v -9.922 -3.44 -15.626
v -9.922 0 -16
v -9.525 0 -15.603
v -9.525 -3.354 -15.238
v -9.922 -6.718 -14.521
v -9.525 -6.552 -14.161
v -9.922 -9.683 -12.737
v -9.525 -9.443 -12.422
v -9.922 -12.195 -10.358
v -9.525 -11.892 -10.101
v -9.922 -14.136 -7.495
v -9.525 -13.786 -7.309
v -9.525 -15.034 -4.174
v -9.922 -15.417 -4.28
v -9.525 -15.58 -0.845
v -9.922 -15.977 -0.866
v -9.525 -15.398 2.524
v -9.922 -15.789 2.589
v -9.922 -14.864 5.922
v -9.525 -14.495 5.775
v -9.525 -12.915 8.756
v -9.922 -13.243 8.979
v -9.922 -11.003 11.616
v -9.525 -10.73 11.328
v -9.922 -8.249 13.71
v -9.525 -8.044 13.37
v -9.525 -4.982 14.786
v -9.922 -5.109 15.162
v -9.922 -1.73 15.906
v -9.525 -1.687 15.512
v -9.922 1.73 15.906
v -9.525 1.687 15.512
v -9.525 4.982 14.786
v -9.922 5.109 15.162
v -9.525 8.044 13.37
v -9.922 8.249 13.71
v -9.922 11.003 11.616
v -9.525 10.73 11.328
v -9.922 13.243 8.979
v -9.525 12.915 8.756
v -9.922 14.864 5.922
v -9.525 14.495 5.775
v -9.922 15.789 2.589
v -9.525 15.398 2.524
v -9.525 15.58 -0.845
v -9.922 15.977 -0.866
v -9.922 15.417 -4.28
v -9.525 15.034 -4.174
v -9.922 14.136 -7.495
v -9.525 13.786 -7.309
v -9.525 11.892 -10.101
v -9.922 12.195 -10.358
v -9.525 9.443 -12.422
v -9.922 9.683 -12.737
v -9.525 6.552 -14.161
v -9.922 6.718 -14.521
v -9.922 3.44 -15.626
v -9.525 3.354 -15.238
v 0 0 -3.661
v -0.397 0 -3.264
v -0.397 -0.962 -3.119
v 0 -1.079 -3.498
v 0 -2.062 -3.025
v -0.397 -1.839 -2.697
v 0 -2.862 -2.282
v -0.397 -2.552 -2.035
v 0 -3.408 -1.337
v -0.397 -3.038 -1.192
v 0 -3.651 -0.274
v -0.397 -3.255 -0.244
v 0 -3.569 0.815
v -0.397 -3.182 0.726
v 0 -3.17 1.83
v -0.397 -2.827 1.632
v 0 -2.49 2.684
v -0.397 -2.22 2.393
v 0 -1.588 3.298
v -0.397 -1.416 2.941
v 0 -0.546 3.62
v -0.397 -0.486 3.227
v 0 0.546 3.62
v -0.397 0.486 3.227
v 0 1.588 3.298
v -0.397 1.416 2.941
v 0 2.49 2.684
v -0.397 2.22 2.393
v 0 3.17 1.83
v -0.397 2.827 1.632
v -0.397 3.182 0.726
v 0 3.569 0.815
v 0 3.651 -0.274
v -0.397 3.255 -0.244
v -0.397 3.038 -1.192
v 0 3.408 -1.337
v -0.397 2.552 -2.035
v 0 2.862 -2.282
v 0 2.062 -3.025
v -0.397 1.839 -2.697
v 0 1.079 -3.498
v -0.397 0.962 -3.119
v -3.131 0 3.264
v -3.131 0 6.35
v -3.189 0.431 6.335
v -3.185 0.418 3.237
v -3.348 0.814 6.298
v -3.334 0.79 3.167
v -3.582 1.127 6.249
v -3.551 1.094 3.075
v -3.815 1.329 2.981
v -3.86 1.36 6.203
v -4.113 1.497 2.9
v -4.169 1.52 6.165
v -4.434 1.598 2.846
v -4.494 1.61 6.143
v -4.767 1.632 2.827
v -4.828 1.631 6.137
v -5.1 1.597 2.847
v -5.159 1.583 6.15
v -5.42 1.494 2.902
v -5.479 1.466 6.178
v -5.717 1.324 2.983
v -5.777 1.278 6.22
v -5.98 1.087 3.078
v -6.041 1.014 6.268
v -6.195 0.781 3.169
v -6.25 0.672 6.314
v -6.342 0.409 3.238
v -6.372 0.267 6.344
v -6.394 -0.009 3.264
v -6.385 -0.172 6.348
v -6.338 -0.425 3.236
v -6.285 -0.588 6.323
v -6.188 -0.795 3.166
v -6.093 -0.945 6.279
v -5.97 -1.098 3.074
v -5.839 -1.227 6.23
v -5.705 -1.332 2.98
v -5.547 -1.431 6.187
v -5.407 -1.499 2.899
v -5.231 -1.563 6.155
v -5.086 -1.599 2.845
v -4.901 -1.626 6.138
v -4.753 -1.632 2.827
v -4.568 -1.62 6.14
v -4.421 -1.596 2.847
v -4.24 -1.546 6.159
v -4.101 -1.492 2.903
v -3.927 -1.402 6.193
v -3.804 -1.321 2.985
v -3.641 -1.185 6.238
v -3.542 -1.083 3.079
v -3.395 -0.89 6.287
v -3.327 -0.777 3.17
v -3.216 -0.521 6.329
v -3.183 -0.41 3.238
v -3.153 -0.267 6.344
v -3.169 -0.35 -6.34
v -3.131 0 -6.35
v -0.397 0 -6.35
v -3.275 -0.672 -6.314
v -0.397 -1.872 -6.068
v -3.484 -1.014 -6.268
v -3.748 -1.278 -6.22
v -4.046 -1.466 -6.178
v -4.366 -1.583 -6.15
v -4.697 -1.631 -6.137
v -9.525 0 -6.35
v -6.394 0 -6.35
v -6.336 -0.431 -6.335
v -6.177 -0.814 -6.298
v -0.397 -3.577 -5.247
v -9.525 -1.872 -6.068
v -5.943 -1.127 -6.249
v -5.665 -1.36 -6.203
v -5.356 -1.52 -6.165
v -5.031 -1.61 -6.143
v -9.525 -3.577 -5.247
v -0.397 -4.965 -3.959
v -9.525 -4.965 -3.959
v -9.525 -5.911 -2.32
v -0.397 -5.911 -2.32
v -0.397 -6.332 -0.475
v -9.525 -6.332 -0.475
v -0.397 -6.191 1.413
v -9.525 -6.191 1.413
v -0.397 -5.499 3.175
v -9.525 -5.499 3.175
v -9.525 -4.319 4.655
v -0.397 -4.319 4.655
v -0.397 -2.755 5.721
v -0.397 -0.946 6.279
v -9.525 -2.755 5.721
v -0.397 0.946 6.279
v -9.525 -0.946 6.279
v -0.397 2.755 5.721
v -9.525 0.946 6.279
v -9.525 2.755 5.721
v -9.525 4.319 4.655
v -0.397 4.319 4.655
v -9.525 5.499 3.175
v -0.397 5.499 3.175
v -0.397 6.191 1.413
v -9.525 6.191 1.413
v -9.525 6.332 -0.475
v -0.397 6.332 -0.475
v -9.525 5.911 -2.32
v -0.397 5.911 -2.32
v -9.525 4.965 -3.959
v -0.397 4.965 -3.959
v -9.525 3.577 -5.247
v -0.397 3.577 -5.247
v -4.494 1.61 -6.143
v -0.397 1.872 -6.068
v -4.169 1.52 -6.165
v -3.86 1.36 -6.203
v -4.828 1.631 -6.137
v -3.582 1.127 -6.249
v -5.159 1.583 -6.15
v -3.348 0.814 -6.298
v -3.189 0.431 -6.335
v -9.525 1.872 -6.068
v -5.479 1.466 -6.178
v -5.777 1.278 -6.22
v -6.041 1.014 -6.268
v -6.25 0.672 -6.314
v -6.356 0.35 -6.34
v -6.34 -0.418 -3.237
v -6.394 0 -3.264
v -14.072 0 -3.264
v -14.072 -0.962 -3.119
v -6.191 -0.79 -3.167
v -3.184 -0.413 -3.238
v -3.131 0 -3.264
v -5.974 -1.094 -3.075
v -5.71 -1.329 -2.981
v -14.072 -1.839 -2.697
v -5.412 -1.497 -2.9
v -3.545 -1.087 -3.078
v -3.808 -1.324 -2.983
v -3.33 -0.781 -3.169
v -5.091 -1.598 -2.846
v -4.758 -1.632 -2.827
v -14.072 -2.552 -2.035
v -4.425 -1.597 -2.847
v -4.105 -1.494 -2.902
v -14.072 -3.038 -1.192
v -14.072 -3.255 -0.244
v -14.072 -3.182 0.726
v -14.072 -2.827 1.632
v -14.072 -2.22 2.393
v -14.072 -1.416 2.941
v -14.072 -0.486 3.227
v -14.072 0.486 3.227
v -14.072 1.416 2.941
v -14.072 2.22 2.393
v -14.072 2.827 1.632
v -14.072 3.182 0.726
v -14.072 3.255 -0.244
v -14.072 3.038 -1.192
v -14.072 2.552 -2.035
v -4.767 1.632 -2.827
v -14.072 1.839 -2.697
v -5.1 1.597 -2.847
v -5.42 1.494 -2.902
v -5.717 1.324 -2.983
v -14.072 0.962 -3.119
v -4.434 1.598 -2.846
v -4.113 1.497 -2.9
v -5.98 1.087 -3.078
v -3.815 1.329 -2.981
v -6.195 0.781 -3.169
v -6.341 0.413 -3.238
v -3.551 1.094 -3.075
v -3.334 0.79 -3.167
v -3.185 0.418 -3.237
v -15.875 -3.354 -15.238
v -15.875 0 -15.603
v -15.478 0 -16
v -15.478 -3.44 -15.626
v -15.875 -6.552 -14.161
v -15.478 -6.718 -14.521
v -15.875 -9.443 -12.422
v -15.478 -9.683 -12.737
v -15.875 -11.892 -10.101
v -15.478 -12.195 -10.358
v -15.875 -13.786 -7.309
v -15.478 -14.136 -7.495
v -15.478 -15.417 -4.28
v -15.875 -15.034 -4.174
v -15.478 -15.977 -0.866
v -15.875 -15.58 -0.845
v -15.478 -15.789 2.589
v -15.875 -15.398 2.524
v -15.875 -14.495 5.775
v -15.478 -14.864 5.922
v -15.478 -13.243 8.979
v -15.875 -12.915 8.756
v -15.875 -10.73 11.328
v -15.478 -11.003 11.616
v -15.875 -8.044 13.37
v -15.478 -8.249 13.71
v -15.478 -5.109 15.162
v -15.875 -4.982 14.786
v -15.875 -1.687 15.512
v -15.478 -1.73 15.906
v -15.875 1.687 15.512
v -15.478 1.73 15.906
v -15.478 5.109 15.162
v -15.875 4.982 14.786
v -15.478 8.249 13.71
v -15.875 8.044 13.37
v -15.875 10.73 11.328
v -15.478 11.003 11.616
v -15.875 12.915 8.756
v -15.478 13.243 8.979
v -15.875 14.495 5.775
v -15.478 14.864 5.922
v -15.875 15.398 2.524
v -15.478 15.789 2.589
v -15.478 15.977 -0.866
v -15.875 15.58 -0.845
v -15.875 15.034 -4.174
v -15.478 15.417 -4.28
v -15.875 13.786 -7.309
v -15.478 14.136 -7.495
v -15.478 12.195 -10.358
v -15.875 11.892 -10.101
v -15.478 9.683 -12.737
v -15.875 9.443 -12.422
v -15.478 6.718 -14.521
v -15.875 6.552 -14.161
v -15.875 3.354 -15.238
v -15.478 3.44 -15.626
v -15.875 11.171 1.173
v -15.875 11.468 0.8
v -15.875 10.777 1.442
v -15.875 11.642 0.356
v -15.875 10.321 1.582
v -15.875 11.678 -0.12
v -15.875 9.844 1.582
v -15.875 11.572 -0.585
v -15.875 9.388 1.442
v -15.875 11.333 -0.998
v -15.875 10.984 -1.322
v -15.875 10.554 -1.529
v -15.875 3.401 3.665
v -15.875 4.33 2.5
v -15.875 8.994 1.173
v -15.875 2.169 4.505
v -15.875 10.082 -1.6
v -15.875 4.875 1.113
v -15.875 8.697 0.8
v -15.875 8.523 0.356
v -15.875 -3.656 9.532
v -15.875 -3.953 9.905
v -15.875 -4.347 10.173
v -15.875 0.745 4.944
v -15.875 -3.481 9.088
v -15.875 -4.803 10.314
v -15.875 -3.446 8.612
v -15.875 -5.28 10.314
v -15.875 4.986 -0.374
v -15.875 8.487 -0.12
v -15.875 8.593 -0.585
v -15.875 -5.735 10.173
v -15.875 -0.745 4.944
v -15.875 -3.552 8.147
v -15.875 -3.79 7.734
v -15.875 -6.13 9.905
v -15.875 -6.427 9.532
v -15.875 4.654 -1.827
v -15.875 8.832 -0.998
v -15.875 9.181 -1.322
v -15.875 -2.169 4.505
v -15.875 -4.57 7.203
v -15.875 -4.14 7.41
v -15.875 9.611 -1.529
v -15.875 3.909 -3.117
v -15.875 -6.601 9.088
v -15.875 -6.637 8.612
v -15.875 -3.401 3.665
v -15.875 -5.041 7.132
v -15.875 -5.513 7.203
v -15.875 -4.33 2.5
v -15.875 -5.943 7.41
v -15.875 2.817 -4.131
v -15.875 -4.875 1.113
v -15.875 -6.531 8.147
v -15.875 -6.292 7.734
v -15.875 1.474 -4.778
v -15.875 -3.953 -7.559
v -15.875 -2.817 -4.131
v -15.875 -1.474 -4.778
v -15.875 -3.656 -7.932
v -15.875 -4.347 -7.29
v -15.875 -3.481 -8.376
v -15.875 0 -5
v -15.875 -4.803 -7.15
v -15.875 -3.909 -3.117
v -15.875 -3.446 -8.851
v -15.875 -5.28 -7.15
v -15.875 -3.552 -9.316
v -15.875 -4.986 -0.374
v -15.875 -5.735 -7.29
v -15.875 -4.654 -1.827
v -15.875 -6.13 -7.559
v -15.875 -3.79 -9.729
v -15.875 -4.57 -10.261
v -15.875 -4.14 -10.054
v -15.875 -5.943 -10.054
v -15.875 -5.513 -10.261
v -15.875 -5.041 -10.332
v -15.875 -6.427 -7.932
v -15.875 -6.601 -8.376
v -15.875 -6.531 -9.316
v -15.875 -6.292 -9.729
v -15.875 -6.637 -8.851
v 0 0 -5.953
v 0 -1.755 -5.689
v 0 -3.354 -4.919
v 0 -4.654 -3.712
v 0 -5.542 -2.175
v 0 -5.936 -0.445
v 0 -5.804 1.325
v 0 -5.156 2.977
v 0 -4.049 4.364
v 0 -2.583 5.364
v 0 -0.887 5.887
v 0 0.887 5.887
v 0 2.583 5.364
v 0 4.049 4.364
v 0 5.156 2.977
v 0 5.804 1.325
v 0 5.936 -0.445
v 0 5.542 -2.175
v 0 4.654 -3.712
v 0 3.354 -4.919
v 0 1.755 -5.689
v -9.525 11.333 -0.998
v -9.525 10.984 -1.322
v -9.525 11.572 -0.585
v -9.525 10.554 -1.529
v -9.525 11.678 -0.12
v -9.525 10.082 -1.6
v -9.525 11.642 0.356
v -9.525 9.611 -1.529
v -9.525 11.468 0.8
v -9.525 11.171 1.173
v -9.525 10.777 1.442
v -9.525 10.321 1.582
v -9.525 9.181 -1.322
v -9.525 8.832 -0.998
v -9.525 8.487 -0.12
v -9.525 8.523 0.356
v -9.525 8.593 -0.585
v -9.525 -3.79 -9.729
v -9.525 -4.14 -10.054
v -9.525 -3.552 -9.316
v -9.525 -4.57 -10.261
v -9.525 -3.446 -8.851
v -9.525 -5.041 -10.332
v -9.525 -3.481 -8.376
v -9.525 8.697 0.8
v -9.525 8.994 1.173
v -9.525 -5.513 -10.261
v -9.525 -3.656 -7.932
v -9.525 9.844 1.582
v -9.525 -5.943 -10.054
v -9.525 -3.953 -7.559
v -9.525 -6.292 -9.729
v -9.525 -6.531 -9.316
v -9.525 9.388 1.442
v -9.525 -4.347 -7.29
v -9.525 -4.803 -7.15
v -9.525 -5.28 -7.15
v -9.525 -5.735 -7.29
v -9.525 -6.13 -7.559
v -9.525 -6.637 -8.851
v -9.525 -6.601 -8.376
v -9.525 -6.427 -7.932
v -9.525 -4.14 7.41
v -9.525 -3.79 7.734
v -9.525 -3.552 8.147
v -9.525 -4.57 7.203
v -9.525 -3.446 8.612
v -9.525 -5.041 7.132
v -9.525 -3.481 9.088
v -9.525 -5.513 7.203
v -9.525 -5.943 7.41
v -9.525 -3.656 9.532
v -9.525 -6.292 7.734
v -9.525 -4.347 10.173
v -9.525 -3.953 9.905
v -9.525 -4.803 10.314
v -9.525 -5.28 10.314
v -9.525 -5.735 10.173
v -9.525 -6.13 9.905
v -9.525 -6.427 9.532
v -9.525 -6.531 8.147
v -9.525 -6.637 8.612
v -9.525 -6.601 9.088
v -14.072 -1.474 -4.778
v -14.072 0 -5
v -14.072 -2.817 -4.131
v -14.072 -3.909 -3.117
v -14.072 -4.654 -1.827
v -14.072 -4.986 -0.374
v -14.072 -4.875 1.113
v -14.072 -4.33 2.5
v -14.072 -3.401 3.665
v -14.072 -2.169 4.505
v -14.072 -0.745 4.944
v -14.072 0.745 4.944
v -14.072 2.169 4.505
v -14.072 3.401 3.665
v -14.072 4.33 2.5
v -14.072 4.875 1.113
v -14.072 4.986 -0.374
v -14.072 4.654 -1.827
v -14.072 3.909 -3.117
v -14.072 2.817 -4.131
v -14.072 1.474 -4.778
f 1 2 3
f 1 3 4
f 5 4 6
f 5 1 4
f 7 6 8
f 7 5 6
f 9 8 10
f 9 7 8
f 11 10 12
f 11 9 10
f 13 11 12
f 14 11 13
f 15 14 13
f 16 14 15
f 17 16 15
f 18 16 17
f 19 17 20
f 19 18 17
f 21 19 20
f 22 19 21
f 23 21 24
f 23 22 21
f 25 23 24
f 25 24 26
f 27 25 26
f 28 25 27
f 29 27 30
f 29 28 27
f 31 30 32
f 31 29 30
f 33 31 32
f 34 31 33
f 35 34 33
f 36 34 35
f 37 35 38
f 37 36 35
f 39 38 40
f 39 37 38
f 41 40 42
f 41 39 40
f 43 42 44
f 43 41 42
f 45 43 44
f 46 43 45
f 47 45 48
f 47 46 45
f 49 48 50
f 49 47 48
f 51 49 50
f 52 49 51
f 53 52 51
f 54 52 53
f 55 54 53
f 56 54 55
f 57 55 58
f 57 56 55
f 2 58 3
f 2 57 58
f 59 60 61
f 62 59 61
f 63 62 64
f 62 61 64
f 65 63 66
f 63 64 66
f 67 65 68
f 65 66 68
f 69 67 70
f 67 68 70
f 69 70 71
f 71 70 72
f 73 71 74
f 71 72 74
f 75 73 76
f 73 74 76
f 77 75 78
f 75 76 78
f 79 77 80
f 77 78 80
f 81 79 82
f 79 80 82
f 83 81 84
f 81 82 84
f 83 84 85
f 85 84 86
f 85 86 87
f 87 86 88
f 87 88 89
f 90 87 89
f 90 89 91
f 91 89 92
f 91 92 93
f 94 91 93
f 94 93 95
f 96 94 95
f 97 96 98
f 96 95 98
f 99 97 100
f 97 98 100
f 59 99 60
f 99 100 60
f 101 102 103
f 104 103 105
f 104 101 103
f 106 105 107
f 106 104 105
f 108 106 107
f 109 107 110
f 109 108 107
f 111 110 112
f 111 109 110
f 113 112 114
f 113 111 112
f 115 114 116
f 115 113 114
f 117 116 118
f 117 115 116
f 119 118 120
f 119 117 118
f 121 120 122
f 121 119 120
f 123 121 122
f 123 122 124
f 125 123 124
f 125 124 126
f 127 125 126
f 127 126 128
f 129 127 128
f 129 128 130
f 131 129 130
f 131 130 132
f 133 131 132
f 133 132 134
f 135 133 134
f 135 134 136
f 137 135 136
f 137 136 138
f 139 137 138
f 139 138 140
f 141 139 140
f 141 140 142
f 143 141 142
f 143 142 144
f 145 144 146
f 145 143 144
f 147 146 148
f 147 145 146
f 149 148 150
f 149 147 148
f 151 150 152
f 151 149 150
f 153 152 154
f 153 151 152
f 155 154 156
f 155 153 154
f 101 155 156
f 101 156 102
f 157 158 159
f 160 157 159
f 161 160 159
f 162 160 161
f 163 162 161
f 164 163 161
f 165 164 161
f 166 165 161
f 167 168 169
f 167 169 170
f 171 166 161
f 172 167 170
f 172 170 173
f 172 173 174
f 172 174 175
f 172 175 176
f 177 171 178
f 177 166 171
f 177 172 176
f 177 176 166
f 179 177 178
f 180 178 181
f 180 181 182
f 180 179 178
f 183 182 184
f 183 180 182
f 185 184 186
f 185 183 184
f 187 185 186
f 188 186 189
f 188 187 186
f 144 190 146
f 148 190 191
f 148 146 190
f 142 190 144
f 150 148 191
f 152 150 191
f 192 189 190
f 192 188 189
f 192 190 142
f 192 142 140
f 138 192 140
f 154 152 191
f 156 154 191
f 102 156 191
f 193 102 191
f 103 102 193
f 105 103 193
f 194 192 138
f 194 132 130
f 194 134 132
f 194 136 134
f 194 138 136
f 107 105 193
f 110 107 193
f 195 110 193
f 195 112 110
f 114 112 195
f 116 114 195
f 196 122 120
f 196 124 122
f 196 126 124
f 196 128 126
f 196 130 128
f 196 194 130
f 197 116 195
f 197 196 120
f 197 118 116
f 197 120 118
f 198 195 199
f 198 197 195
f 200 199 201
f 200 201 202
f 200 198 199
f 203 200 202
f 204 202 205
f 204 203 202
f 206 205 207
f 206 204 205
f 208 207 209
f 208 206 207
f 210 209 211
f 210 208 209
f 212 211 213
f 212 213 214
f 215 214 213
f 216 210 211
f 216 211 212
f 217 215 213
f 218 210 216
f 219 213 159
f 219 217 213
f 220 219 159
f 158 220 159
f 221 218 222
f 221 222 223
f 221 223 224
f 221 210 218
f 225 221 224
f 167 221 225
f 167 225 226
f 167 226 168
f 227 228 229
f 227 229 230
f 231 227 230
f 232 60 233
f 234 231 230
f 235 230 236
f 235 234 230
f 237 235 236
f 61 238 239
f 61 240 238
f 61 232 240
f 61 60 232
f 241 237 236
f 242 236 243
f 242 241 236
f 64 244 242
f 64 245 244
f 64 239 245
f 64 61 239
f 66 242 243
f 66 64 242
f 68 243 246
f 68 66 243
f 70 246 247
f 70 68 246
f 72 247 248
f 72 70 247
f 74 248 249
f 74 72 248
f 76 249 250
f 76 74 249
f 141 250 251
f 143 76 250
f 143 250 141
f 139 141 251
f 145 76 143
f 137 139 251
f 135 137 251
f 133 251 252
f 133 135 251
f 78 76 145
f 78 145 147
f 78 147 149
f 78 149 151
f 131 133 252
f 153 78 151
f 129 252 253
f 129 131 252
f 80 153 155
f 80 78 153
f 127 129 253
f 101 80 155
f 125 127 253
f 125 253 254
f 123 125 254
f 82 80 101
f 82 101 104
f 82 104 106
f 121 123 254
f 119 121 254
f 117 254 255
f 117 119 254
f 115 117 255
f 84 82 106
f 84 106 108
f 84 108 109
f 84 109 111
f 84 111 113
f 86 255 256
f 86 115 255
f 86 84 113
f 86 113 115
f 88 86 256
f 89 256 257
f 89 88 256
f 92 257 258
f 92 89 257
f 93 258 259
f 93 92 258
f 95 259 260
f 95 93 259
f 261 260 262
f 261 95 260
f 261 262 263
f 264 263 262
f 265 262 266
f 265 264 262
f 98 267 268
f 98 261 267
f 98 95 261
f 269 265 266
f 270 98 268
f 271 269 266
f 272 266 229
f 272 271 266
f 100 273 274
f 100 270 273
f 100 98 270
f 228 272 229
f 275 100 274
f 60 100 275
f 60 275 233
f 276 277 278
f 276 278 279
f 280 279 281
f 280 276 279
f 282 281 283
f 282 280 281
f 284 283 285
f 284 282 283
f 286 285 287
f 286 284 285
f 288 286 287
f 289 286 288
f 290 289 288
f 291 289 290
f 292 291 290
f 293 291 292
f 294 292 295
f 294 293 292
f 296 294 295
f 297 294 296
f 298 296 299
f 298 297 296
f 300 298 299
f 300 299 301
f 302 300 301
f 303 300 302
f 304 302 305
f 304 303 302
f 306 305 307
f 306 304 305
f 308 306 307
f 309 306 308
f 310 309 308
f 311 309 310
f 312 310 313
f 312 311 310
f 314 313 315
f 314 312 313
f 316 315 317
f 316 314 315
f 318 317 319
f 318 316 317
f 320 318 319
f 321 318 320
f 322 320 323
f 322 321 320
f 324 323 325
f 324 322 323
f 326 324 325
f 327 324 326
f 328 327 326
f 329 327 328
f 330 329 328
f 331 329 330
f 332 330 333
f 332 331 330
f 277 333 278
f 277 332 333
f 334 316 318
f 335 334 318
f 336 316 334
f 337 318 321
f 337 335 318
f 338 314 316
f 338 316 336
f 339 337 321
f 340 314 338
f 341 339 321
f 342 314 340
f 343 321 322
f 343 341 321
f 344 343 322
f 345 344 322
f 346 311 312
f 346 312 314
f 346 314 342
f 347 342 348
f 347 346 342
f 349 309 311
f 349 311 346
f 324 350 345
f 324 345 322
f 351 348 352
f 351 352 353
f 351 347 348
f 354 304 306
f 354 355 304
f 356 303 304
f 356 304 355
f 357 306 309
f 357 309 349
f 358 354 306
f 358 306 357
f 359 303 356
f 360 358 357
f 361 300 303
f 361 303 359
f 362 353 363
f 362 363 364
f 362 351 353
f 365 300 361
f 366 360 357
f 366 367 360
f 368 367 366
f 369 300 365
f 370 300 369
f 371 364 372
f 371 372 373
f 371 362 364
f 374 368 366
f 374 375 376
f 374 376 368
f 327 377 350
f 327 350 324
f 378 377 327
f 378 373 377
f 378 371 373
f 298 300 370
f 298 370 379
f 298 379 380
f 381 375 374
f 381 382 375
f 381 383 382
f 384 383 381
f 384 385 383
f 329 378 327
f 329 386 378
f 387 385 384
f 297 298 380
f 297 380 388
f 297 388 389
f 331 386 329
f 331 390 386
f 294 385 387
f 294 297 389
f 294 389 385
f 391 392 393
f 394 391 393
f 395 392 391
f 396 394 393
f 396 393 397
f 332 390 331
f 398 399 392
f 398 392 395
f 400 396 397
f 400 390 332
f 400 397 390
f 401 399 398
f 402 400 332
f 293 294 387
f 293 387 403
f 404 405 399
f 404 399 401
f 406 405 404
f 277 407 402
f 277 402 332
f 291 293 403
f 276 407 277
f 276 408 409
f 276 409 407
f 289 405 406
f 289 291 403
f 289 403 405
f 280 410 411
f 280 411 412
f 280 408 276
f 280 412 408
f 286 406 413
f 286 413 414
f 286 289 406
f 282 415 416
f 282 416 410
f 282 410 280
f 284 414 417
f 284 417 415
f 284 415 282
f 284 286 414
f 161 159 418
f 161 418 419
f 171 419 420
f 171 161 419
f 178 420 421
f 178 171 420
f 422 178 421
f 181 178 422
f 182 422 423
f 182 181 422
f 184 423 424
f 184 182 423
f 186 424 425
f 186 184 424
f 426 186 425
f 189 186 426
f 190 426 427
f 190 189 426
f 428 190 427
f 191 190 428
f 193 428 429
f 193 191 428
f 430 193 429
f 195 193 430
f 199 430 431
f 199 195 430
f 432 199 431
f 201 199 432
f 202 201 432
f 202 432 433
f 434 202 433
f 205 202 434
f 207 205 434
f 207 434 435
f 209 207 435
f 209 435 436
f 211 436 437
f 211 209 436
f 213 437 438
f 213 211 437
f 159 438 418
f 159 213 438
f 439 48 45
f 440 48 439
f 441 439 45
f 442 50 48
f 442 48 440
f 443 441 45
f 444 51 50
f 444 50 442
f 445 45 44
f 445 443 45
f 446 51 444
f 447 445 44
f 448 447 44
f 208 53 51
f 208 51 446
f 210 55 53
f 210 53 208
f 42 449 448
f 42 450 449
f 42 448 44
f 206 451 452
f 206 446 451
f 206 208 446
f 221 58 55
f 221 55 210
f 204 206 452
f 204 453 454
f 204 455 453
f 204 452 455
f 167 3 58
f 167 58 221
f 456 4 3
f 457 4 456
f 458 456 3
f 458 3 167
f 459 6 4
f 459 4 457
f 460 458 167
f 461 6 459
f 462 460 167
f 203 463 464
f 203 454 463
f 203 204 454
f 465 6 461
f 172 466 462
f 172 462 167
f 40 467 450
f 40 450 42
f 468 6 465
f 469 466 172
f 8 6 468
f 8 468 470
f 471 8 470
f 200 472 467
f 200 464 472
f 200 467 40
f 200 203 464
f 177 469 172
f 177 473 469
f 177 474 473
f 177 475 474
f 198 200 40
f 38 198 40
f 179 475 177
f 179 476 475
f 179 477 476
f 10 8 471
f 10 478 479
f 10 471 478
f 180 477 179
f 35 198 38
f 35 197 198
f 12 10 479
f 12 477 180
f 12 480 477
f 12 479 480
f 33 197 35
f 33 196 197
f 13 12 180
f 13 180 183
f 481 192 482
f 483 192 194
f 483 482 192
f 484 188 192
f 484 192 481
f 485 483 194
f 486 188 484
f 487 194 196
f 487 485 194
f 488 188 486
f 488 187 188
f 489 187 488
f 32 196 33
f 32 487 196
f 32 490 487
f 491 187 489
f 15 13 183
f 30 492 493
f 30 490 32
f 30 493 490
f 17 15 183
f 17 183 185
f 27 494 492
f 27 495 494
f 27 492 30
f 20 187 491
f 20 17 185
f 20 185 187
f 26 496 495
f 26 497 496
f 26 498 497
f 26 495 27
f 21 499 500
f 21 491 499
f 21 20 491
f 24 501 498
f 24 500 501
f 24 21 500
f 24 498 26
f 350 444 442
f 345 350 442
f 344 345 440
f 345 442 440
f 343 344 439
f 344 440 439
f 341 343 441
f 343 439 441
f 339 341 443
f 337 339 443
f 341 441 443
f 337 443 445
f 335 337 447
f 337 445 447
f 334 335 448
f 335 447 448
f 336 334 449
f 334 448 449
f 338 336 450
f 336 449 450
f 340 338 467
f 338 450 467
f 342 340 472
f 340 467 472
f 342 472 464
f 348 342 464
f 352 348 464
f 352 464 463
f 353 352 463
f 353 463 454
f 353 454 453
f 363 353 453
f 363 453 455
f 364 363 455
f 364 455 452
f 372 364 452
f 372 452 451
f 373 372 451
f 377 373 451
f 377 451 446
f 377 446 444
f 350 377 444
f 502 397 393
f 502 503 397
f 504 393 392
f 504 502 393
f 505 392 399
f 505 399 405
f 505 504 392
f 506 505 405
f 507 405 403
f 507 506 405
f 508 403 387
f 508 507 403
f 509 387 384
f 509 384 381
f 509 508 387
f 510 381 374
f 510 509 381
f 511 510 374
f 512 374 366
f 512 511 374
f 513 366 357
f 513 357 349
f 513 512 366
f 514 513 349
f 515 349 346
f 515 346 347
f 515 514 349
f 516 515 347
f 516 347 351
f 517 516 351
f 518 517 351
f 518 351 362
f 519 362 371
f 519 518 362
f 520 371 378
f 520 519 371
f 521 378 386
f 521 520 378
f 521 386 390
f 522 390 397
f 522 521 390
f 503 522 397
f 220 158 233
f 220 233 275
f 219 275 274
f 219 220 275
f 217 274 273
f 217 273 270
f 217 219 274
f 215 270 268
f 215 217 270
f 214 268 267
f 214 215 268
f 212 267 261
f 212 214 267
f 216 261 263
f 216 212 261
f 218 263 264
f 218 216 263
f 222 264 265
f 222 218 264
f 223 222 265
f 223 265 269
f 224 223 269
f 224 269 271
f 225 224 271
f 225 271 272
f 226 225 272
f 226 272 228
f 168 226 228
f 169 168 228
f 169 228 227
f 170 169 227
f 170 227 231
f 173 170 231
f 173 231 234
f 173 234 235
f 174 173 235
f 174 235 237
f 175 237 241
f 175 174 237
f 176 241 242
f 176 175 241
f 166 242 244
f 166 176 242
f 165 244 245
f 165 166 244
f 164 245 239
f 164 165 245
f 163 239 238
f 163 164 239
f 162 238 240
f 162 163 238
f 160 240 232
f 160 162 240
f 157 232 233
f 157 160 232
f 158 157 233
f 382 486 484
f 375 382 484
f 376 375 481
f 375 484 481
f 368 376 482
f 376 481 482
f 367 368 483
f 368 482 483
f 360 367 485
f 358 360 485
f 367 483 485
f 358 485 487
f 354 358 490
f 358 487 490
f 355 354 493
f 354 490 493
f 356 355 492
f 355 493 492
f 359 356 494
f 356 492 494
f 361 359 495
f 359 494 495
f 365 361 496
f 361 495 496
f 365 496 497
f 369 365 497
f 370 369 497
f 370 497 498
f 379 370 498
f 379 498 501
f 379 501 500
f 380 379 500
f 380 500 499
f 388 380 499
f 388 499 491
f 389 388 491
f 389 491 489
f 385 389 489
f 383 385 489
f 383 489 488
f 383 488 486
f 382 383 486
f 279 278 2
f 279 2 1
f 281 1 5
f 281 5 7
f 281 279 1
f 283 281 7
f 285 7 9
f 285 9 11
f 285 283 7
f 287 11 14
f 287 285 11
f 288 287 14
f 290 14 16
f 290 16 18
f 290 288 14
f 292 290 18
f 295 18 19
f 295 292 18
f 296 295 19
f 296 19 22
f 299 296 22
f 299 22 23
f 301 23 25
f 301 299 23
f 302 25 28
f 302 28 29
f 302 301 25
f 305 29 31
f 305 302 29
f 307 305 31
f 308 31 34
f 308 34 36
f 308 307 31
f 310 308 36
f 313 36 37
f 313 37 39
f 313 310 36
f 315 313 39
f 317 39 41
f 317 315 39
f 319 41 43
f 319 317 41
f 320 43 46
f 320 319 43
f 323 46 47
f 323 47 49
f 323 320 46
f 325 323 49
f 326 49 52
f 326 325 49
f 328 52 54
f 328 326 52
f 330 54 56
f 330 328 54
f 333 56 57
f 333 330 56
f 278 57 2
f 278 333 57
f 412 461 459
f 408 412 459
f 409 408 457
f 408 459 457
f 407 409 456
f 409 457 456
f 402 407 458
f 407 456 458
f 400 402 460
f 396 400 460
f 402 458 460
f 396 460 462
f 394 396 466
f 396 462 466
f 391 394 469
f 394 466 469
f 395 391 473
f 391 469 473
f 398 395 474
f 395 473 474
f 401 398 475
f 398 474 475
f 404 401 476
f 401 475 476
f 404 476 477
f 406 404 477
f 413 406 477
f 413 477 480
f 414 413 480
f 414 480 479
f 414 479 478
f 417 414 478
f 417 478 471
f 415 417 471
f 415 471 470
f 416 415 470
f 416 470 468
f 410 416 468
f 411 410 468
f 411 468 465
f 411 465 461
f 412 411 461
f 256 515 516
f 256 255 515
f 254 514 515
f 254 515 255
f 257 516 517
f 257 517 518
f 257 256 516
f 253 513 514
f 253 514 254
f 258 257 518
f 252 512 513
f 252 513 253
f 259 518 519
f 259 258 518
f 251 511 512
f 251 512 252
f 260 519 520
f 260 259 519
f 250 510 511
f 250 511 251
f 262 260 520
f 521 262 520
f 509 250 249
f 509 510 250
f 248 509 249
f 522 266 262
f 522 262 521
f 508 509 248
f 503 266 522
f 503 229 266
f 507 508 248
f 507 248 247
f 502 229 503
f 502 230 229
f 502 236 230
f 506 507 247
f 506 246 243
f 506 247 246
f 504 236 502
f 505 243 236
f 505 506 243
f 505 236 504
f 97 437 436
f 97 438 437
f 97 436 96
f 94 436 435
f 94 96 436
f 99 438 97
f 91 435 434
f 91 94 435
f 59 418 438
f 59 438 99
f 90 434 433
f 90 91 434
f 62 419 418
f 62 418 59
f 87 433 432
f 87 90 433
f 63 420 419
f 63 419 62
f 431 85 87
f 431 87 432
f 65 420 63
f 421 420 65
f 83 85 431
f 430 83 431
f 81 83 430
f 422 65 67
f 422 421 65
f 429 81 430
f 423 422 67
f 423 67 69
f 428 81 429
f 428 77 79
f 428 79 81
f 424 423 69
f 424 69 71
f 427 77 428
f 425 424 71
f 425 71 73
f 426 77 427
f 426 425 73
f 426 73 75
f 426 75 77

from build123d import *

# Parameters (mm, degrees)
PIN_CUT_DEPTH                  = 28.640832567
PIN_CUT_DEPTH_BACK             = 28.640832567
SKETCH3_R                      = 1.63195
SKETCH2_R                      = 1.6
F_3MM_CLOSE_FIT_BOLT_CUT_DEPTH = 25.550471012
CHAMFER1_SIZE                  = 0.396875


with BuildPart() as part:
    # Sketch1 → Revolve1 (revolve)
    with BuildSketch(Plane.XY, mode=Mode.PRIVATE) as revolve1_sk:
        Polygon((0, 3.2639), (0, 6.35), (-9.525, 6.35), (-9.525, 16), (-15.875, 16), (-15.875, 5), (-14.0716, 5), (-14.0716, 3.2639), align=None)
    revolve(revolve1_sk.sketch.rotate(Axis((0, 0, 0), (-1, 0, 0)), 90), axis=Axis((0, 0, 0), (-1, 0, 0)))

    # Sketch3 → Pin Cut (cut, two sides: drawn at the far end of the back side and taken through both)
    with BuildSketch(Plane.XY.offset(-PIN_CUT_DEPTH_BACK)):
        with Locations((-4.7625, 0)):
            Circle(SKETCH3_R)
    extrude(amount=PIN_CUT_DEPTH + PIN_CUT_DEPTH_BACK, mode=Mode.SUBTRACT)

    # Sketch2 → 3mm Close Fit Bolt Cut (cut, through all)
    with BuildSketch(Plane(origin=(-9.525, 0, 0), x_dir=(0, 0, -1), z_dir=(1, 0, 0))):
        with Locations((0, 10.082498691)):
            Circle(SKETCH2_R)
        with Locations((-8.7317, -5.041249345)):
            Circle(SKETCH2_R)
        with Locations((8.7317, -5.041249345)):
            Circle(SKETCH2_R)
    extrude(amount=-F_3MM_CLOSE_FIT_BOLT_CUT_DEPTH, mode=Mode.SUBTRACT)

    # Chamfer1
    chamfer1_edges = [part.edges().sort_by_distance(p)[0] for p in [
        (0, 0, 3.2639),
        (-15.875, 0, 16),
        (-9.525, 0, 16),
        (0, 0, 6.35),
    ]]
    chamfer(chamfer1_edges, length=CHAMFER1_SIZE)


solid = part.part
